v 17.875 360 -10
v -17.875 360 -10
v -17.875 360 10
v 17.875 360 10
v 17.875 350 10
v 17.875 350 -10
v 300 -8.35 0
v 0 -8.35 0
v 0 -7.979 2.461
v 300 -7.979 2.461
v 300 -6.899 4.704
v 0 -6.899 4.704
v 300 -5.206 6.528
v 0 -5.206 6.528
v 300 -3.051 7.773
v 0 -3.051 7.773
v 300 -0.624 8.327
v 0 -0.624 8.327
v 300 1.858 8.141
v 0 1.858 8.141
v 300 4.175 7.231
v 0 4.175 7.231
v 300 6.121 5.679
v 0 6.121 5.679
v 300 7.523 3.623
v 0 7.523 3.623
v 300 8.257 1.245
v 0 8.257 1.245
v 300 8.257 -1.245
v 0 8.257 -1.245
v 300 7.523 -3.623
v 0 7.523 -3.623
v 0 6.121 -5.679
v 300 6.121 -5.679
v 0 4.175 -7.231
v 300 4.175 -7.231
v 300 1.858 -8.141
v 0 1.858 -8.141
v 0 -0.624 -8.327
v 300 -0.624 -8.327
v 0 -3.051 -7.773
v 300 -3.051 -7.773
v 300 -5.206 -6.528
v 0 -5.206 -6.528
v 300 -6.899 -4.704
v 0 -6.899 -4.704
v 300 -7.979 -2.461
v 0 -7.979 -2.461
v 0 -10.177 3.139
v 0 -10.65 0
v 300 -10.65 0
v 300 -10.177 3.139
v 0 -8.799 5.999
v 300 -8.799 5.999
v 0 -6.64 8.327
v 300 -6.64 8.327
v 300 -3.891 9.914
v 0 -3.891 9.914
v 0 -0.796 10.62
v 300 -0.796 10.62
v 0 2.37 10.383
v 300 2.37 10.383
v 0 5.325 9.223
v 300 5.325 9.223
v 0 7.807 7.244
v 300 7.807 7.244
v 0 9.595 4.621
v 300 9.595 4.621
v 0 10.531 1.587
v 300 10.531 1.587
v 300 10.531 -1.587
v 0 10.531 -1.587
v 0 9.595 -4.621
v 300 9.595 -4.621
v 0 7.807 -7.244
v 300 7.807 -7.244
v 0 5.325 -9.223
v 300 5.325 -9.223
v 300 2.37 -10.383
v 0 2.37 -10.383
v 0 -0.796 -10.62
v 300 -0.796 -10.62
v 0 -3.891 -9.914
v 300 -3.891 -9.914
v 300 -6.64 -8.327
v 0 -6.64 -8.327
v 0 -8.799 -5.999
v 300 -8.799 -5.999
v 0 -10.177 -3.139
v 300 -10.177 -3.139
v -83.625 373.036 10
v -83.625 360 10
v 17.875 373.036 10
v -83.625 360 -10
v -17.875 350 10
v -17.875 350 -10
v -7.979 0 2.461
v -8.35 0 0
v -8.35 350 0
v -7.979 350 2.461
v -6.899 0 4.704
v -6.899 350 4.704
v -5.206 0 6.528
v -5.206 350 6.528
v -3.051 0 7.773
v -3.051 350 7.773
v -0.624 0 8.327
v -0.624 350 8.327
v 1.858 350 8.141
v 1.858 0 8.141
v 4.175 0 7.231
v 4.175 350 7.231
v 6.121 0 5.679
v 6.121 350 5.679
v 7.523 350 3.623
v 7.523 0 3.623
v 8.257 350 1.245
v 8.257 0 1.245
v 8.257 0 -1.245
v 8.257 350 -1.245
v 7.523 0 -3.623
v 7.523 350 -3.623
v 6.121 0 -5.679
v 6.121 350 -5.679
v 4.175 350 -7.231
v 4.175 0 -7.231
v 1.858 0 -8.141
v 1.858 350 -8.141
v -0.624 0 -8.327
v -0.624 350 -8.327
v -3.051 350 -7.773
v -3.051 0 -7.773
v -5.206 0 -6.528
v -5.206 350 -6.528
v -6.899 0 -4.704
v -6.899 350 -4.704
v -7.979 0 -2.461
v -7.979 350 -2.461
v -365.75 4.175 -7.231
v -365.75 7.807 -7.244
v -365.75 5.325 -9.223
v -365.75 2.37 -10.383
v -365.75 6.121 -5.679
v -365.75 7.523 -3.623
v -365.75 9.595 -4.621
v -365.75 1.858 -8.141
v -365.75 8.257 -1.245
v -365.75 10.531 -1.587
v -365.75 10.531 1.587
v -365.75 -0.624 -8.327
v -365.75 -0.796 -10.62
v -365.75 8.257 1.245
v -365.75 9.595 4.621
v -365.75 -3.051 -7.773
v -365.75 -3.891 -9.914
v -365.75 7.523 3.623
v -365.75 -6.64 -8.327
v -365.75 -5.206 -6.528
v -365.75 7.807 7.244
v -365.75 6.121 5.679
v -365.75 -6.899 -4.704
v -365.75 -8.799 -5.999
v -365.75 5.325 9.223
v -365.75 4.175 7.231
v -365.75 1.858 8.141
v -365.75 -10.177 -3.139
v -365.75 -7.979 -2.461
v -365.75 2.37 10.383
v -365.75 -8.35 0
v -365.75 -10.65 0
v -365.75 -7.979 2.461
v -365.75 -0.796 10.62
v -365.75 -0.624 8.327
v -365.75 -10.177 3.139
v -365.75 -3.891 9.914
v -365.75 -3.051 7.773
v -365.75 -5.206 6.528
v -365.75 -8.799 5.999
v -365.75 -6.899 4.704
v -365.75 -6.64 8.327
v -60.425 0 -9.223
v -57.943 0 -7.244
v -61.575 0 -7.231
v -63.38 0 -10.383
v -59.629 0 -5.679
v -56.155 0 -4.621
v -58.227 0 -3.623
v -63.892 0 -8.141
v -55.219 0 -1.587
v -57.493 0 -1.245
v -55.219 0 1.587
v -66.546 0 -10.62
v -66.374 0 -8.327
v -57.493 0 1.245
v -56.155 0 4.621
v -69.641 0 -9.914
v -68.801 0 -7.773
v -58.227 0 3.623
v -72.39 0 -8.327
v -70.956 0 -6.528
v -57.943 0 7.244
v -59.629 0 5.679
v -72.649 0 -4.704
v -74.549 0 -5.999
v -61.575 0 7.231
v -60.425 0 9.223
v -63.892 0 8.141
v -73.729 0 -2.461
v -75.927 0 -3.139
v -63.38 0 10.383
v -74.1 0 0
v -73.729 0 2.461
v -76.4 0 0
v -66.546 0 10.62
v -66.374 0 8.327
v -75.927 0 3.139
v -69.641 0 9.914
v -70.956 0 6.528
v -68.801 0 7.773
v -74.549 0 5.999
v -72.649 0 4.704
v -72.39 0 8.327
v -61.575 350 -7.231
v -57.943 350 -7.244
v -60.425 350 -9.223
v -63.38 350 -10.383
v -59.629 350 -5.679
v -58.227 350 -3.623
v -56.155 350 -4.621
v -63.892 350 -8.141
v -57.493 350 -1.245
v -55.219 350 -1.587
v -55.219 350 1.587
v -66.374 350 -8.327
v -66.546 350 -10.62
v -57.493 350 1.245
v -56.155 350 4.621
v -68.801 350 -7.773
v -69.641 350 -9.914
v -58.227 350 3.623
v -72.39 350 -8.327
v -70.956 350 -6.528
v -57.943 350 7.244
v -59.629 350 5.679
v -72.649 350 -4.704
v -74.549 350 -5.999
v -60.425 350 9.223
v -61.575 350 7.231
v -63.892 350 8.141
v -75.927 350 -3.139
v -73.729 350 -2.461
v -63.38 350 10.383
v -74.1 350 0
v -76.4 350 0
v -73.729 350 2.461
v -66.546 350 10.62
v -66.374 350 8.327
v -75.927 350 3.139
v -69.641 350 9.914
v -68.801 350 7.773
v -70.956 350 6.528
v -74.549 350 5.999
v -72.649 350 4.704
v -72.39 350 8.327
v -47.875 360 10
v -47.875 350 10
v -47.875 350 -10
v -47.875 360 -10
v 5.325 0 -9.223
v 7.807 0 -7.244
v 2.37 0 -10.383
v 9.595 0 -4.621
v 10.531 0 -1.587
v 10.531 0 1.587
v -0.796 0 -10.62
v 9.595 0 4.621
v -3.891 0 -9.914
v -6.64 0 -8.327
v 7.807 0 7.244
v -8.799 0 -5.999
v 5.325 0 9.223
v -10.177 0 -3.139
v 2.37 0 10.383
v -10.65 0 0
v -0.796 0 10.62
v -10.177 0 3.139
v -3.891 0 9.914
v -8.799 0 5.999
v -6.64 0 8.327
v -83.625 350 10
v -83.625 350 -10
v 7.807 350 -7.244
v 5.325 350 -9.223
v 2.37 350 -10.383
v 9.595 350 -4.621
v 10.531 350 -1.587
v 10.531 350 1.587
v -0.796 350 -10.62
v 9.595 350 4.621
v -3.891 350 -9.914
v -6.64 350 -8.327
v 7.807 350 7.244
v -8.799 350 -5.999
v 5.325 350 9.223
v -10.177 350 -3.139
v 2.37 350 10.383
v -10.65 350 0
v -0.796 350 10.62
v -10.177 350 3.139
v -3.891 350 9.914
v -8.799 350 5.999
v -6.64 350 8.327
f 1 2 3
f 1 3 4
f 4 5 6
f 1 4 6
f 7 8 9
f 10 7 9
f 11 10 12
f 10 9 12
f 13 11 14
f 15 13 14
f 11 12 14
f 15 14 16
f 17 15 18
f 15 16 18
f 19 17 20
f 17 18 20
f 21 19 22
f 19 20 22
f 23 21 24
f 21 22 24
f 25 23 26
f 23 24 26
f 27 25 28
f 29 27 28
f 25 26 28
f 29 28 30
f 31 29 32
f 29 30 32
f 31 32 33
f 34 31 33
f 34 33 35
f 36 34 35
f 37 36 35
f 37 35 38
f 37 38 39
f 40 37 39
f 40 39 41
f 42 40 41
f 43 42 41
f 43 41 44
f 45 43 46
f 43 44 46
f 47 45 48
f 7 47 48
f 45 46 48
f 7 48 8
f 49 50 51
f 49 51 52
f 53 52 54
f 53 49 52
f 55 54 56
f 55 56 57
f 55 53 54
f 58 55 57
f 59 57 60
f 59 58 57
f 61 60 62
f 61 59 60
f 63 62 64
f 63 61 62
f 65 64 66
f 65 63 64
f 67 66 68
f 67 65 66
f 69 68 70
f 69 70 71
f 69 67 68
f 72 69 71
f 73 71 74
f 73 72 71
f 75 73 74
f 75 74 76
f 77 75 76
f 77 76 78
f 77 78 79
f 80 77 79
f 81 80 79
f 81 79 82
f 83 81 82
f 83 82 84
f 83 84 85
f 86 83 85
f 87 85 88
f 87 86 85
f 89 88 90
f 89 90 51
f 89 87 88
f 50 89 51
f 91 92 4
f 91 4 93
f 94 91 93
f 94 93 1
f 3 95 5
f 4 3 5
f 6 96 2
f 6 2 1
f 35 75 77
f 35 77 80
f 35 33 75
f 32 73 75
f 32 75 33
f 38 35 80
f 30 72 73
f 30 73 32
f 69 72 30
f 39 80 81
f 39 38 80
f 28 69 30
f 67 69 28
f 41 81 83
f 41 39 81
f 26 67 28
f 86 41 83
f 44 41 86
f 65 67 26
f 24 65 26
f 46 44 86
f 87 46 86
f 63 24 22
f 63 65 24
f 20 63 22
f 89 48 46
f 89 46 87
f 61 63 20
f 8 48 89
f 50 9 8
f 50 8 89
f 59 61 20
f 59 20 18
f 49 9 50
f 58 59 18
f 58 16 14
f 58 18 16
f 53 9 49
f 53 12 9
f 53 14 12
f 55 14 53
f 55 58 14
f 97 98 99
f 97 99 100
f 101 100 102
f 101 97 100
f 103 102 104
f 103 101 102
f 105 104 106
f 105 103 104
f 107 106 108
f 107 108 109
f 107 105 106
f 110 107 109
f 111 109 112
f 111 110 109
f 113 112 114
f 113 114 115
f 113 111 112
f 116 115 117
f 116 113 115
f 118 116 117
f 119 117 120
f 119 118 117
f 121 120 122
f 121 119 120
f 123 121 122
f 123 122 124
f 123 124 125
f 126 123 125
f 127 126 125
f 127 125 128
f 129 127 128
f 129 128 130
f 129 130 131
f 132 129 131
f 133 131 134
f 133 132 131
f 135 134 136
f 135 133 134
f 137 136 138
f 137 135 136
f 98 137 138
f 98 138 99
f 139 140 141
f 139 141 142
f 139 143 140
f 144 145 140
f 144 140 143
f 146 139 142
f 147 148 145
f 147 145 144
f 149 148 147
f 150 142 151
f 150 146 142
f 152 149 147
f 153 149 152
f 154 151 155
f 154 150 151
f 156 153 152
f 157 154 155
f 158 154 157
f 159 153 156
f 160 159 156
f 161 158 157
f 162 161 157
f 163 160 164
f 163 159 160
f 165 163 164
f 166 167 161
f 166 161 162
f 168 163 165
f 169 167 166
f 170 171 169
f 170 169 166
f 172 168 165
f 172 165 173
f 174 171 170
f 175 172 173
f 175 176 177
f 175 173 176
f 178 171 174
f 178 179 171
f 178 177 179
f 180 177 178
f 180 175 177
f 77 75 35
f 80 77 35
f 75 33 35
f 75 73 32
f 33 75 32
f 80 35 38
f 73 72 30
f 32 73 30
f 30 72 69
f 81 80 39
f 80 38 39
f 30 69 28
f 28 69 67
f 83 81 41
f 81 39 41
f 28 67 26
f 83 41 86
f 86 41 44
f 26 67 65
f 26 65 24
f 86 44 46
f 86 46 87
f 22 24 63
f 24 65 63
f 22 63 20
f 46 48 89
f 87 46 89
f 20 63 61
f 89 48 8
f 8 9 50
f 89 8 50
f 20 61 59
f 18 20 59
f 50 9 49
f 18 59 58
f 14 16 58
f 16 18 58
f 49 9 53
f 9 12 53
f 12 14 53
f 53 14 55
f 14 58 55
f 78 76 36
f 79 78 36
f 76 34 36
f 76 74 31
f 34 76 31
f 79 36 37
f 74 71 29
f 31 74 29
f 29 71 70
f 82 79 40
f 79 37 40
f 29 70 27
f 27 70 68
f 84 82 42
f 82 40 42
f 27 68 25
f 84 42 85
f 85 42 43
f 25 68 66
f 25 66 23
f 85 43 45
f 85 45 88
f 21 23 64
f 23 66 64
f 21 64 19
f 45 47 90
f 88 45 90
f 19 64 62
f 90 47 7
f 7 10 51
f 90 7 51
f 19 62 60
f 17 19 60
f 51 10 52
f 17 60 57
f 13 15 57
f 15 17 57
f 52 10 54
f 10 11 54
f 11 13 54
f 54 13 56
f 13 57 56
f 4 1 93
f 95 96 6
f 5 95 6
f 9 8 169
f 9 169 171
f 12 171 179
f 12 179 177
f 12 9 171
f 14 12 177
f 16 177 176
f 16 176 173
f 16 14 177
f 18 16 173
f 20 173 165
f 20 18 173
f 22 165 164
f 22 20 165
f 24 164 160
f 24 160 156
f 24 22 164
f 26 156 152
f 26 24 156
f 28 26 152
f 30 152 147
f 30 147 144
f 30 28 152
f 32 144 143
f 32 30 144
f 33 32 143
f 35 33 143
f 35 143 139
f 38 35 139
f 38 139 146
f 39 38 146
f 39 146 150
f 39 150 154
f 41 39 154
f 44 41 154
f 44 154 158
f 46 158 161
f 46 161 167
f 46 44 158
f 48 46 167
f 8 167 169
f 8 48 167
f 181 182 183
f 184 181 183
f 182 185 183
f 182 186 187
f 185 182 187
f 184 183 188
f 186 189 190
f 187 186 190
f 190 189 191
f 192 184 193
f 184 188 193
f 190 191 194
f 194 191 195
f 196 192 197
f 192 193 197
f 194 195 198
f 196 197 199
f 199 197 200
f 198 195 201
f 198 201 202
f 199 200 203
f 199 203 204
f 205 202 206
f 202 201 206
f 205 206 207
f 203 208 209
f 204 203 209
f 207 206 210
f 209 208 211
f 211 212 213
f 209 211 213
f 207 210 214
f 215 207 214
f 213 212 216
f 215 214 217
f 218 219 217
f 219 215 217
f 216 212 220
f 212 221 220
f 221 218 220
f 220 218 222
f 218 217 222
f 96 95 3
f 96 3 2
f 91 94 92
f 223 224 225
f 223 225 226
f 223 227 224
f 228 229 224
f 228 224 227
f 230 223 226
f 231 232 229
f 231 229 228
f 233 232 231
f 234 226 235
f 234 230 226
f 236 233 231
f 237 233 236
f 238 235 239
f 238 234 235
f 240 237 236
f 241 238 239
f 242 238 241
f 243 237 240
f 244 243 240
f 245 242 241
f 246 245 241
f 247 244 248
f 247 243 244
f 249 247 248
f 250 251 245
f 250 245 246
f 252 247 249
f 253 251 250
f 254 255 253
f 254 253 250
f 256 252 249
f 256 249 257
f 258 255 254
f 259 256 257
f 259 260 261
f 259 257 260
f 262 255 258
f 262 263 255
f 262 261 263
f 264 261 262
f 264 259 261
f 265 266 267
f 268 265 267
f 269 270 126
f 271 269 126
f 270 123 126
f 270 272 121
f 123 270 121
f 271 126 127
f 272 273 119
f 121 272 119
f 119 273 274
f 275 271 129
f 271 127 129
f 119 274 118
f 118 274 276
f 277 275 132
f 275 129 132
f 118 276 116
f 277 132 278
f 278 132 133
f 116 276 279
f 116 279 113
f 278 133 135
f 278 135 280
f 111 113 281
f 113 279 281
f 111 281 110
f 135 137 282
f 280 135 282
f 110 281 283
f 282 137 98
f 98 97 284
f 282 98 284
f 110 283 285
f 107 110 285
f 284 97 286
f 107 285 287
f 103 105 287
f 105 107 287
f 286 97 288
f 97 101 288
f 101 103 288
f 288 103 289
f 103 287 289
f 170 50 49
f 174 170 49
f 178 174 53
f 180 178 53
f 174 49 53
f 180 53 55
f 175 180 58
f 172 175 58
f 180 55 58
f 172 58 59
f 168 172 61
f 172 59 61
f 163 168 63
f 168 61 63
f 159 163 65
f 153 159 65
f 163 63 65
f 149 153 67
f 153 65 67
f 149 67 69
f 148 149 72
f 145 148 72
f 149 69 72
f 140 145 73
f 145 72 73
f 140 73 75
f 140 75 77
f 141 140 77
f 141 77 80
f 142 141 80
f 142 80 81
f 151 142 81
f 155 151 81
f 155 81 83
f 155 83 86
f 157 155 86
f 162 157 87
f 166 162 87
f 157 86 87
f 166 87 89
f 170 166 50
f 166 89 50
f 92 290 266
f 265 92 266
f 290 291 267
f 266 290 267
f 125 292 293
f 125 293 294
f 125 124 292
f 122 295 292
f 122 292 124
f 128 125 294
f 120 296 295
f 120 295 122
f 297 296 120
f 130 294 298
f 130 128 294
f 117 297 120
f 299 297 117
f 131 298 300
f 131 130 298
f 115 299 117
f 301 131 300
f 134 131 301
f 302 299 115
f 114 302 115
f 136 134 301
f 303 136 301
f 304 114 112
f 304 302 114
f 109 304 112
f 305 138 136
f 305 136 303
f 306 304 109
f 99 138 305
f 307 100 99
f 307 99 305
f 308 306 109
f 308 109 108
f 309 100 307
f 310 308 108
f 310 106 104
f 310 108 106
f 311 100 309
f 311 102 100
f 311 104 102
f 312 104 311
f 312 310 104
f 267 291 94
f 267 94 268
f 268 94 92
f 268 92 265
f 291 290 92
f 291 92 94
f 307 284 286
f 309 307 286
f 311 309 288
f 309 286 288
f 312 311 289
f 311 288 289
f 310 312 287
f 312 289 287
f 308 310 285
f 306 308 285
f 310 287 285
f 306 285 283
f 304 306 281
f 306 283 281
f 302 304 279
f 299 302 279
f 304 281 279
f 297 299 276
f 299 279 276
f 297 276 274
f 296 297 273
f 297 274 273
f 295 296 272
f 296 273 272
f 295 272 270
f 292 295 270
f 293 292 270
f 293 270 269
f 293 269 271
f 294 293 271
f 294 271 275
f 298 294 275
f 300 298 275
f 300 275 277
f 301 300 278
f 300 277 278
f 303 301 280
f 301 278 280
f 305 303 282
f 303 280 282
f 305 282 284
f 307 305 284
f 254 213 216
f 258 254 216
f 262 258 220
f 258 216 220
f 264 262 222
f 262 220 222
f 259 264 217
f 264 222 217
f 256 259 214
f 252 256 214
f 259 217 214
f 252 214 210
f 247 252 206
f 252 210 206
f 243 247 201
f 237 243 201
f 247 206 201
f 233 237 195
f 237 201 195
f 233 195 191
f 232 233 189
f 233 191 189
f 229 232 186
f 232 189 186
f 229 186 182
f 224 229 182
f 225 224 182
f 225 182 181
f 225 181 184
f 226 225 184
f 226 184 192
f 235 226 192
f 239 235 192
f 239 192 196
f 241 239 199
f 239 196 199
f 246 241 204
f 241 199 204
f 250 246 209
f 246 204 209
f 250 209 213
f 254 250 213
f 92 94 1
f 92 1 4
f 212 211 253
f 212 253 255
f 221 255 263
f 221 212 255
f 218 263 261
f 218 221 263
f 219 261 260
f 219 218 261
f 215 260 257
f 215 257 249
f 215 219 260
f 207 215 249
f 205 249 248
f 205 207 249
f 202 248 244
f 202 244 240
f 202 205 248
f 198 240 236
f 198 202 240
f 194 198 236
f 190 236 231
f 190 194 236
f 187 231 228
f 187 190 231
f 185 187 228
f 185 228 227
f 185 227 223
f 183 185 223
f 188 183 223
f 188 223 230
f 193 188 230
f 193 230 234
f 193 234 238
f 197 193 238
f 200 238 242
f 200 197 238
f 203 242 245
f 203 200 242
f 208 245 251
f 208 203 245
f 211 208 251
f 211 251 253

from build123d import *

# Parameters (mm, degrees)
SKETCH12_R                           = 10.65
SKETCH12_R_2                         = 8.35
PIPE_CONFIGURED_21_3_X_2_3_1_DEPTH   = 350
SKETCH12_ON_SEGMENT_2_R              = 10.65
SKETCH12_ON_SEGMENT_2_R_2            = 8.35
PIPE_CONFIGURED_21_3_X_2_3_1_2_DEPTH = 350
SKETCH13_R                           = 10.65
SKETCH13_R_2                         = 8.35
PIPE_CONFIGURED_21_3_X_2_3_2_DEPTH   = 300
SKETCH13_ON_SEGMENT_2_R              = 10.65
SKETCH13_ON_SEGMENT_2_R_2            = 8.35
PIPE_CONFIGURED_21_3_X_2_3_2_2_DEPTH = 365.75
SKETCH15_W                           = 35.75
SKETCH15_H                           = 20
BOSS_EXTRUDE3_DEPTH                  = 10
BOSS_EXTRUDE3_2_DEPTH                = 10
BOSS_EXTRUDE4_DEPTH                  = 101.5


with BuildPart() as part:
    # Sketch12 → Pipe - configured 21.3 X 2.3(1) (new body)
    with BuildSketch(Plane(origin=(-65.75, 0, 0), x_dir=(-1, 0, 0), z_dir=(0, 1, 0))):
        Circle(SKETCH12_R)
        Circle(SKETCH12_R_2, mode=Mode.SUBTRACT)
    extrude(amount=PIPE_CONFIGURED_21_3_X_2_3_1_DEPTH)


with BuildPart() as body_2:
    # Sketch12 on segment 2 (carried to segment 2) → Pipe - configured 21.3 X 2.3_1 2 (new body)
    with BuildSketch(Plane(origin=(0, 0, 0), x_dir=(-1, 0, 0), z_dir=(0, 1, 0))):
        Circle(SKETCH12_ON_SEGMENT_2_R)
        Circle(SKETCH12_ON_SEGMENT_2_R_2, mode=Mode.SUBTRACT)
    extrude(amount=PIPE_CONFIGURED_21_3_X_2_3_1_2_DEPTH)


with BuildPart() as body_3:
    # Sketch13 → Pipe - configured 21.3 X 2.3(2) (new body)
    with BuildSketch(Plane(origin=(0, 0, 0), x_dir=(0, -1, 0), z_dir=(-1, 0, 0))):
        Circle(SKETCH13_R)
        Circle(SKETCH13_R_2, mode=Mode.SUBTRACT)
    extrude(amount=-PIPE_CONFIGURED_21_3_X_2_3_2_DEPTH)


with BuildPart() as body_4:
    # Sketch13 on segment 2 (carried to segment 2) → Pipe - configured 21.3 X 2.3_2 2 (new body)
    with BuildSketch(Plane(origin=(0, 0, 0), x_dir=(0, -1, 0), z_dir=(-1, 0, 0))):
        Circle(SKETCH13_ON_SEGMENT_2_R)
        Circle(SKETCH13_ON_SEGMENT_2_R_2, mode=Mode.SUBTRACT)
    extrude(amount=PIPE_CONFIGURED_21_3_X_2_3_2_2_DEPTH)


with BuildPart() as body_5:
    # Sketch15 → Boss-Extrude3 (new body)
    with BuildSketch(Plane(origin=(0, 350, 0), x_dir=(1, 0, 0), z_dir=(0, 1, 0))):
        with Locations((-65.75, 0)):
            Rectangle(SKETCH15_W, SKETCH15_H)
    extrude(amount=BOSS_EXTRUDE3_DEPTH)


with BuildPart() as body_6:
    # Sketch15 → Boss-Extrude3 2 (new body)
    with BuildSketch(Plane(origin=(0, 350, 0), x_dir=(1, 0, 0), z_dir=(0, 1, 0))):
        Rectangle(SKETCH15_W, SKETCH15_H)
    extrude(amount=BOSS_EXTRUDE3_2_DEPTH)


with BuildPart() as body_7:
    # Sketch16 → Boss-Extrude4 (new body)
    with BuildSketch(Plane.ZY.offset(83.625)):
        Polygon((10, 360), (10, 373.036425871), (-10, 360), align=None)
    extrude(amount=-BOSS_EXTRUDE4_DEPTH)


solid = Compound([part.part, body_2.part, body_3.part, body_4.part, body_5.part, body_6.part, body_7.part])
